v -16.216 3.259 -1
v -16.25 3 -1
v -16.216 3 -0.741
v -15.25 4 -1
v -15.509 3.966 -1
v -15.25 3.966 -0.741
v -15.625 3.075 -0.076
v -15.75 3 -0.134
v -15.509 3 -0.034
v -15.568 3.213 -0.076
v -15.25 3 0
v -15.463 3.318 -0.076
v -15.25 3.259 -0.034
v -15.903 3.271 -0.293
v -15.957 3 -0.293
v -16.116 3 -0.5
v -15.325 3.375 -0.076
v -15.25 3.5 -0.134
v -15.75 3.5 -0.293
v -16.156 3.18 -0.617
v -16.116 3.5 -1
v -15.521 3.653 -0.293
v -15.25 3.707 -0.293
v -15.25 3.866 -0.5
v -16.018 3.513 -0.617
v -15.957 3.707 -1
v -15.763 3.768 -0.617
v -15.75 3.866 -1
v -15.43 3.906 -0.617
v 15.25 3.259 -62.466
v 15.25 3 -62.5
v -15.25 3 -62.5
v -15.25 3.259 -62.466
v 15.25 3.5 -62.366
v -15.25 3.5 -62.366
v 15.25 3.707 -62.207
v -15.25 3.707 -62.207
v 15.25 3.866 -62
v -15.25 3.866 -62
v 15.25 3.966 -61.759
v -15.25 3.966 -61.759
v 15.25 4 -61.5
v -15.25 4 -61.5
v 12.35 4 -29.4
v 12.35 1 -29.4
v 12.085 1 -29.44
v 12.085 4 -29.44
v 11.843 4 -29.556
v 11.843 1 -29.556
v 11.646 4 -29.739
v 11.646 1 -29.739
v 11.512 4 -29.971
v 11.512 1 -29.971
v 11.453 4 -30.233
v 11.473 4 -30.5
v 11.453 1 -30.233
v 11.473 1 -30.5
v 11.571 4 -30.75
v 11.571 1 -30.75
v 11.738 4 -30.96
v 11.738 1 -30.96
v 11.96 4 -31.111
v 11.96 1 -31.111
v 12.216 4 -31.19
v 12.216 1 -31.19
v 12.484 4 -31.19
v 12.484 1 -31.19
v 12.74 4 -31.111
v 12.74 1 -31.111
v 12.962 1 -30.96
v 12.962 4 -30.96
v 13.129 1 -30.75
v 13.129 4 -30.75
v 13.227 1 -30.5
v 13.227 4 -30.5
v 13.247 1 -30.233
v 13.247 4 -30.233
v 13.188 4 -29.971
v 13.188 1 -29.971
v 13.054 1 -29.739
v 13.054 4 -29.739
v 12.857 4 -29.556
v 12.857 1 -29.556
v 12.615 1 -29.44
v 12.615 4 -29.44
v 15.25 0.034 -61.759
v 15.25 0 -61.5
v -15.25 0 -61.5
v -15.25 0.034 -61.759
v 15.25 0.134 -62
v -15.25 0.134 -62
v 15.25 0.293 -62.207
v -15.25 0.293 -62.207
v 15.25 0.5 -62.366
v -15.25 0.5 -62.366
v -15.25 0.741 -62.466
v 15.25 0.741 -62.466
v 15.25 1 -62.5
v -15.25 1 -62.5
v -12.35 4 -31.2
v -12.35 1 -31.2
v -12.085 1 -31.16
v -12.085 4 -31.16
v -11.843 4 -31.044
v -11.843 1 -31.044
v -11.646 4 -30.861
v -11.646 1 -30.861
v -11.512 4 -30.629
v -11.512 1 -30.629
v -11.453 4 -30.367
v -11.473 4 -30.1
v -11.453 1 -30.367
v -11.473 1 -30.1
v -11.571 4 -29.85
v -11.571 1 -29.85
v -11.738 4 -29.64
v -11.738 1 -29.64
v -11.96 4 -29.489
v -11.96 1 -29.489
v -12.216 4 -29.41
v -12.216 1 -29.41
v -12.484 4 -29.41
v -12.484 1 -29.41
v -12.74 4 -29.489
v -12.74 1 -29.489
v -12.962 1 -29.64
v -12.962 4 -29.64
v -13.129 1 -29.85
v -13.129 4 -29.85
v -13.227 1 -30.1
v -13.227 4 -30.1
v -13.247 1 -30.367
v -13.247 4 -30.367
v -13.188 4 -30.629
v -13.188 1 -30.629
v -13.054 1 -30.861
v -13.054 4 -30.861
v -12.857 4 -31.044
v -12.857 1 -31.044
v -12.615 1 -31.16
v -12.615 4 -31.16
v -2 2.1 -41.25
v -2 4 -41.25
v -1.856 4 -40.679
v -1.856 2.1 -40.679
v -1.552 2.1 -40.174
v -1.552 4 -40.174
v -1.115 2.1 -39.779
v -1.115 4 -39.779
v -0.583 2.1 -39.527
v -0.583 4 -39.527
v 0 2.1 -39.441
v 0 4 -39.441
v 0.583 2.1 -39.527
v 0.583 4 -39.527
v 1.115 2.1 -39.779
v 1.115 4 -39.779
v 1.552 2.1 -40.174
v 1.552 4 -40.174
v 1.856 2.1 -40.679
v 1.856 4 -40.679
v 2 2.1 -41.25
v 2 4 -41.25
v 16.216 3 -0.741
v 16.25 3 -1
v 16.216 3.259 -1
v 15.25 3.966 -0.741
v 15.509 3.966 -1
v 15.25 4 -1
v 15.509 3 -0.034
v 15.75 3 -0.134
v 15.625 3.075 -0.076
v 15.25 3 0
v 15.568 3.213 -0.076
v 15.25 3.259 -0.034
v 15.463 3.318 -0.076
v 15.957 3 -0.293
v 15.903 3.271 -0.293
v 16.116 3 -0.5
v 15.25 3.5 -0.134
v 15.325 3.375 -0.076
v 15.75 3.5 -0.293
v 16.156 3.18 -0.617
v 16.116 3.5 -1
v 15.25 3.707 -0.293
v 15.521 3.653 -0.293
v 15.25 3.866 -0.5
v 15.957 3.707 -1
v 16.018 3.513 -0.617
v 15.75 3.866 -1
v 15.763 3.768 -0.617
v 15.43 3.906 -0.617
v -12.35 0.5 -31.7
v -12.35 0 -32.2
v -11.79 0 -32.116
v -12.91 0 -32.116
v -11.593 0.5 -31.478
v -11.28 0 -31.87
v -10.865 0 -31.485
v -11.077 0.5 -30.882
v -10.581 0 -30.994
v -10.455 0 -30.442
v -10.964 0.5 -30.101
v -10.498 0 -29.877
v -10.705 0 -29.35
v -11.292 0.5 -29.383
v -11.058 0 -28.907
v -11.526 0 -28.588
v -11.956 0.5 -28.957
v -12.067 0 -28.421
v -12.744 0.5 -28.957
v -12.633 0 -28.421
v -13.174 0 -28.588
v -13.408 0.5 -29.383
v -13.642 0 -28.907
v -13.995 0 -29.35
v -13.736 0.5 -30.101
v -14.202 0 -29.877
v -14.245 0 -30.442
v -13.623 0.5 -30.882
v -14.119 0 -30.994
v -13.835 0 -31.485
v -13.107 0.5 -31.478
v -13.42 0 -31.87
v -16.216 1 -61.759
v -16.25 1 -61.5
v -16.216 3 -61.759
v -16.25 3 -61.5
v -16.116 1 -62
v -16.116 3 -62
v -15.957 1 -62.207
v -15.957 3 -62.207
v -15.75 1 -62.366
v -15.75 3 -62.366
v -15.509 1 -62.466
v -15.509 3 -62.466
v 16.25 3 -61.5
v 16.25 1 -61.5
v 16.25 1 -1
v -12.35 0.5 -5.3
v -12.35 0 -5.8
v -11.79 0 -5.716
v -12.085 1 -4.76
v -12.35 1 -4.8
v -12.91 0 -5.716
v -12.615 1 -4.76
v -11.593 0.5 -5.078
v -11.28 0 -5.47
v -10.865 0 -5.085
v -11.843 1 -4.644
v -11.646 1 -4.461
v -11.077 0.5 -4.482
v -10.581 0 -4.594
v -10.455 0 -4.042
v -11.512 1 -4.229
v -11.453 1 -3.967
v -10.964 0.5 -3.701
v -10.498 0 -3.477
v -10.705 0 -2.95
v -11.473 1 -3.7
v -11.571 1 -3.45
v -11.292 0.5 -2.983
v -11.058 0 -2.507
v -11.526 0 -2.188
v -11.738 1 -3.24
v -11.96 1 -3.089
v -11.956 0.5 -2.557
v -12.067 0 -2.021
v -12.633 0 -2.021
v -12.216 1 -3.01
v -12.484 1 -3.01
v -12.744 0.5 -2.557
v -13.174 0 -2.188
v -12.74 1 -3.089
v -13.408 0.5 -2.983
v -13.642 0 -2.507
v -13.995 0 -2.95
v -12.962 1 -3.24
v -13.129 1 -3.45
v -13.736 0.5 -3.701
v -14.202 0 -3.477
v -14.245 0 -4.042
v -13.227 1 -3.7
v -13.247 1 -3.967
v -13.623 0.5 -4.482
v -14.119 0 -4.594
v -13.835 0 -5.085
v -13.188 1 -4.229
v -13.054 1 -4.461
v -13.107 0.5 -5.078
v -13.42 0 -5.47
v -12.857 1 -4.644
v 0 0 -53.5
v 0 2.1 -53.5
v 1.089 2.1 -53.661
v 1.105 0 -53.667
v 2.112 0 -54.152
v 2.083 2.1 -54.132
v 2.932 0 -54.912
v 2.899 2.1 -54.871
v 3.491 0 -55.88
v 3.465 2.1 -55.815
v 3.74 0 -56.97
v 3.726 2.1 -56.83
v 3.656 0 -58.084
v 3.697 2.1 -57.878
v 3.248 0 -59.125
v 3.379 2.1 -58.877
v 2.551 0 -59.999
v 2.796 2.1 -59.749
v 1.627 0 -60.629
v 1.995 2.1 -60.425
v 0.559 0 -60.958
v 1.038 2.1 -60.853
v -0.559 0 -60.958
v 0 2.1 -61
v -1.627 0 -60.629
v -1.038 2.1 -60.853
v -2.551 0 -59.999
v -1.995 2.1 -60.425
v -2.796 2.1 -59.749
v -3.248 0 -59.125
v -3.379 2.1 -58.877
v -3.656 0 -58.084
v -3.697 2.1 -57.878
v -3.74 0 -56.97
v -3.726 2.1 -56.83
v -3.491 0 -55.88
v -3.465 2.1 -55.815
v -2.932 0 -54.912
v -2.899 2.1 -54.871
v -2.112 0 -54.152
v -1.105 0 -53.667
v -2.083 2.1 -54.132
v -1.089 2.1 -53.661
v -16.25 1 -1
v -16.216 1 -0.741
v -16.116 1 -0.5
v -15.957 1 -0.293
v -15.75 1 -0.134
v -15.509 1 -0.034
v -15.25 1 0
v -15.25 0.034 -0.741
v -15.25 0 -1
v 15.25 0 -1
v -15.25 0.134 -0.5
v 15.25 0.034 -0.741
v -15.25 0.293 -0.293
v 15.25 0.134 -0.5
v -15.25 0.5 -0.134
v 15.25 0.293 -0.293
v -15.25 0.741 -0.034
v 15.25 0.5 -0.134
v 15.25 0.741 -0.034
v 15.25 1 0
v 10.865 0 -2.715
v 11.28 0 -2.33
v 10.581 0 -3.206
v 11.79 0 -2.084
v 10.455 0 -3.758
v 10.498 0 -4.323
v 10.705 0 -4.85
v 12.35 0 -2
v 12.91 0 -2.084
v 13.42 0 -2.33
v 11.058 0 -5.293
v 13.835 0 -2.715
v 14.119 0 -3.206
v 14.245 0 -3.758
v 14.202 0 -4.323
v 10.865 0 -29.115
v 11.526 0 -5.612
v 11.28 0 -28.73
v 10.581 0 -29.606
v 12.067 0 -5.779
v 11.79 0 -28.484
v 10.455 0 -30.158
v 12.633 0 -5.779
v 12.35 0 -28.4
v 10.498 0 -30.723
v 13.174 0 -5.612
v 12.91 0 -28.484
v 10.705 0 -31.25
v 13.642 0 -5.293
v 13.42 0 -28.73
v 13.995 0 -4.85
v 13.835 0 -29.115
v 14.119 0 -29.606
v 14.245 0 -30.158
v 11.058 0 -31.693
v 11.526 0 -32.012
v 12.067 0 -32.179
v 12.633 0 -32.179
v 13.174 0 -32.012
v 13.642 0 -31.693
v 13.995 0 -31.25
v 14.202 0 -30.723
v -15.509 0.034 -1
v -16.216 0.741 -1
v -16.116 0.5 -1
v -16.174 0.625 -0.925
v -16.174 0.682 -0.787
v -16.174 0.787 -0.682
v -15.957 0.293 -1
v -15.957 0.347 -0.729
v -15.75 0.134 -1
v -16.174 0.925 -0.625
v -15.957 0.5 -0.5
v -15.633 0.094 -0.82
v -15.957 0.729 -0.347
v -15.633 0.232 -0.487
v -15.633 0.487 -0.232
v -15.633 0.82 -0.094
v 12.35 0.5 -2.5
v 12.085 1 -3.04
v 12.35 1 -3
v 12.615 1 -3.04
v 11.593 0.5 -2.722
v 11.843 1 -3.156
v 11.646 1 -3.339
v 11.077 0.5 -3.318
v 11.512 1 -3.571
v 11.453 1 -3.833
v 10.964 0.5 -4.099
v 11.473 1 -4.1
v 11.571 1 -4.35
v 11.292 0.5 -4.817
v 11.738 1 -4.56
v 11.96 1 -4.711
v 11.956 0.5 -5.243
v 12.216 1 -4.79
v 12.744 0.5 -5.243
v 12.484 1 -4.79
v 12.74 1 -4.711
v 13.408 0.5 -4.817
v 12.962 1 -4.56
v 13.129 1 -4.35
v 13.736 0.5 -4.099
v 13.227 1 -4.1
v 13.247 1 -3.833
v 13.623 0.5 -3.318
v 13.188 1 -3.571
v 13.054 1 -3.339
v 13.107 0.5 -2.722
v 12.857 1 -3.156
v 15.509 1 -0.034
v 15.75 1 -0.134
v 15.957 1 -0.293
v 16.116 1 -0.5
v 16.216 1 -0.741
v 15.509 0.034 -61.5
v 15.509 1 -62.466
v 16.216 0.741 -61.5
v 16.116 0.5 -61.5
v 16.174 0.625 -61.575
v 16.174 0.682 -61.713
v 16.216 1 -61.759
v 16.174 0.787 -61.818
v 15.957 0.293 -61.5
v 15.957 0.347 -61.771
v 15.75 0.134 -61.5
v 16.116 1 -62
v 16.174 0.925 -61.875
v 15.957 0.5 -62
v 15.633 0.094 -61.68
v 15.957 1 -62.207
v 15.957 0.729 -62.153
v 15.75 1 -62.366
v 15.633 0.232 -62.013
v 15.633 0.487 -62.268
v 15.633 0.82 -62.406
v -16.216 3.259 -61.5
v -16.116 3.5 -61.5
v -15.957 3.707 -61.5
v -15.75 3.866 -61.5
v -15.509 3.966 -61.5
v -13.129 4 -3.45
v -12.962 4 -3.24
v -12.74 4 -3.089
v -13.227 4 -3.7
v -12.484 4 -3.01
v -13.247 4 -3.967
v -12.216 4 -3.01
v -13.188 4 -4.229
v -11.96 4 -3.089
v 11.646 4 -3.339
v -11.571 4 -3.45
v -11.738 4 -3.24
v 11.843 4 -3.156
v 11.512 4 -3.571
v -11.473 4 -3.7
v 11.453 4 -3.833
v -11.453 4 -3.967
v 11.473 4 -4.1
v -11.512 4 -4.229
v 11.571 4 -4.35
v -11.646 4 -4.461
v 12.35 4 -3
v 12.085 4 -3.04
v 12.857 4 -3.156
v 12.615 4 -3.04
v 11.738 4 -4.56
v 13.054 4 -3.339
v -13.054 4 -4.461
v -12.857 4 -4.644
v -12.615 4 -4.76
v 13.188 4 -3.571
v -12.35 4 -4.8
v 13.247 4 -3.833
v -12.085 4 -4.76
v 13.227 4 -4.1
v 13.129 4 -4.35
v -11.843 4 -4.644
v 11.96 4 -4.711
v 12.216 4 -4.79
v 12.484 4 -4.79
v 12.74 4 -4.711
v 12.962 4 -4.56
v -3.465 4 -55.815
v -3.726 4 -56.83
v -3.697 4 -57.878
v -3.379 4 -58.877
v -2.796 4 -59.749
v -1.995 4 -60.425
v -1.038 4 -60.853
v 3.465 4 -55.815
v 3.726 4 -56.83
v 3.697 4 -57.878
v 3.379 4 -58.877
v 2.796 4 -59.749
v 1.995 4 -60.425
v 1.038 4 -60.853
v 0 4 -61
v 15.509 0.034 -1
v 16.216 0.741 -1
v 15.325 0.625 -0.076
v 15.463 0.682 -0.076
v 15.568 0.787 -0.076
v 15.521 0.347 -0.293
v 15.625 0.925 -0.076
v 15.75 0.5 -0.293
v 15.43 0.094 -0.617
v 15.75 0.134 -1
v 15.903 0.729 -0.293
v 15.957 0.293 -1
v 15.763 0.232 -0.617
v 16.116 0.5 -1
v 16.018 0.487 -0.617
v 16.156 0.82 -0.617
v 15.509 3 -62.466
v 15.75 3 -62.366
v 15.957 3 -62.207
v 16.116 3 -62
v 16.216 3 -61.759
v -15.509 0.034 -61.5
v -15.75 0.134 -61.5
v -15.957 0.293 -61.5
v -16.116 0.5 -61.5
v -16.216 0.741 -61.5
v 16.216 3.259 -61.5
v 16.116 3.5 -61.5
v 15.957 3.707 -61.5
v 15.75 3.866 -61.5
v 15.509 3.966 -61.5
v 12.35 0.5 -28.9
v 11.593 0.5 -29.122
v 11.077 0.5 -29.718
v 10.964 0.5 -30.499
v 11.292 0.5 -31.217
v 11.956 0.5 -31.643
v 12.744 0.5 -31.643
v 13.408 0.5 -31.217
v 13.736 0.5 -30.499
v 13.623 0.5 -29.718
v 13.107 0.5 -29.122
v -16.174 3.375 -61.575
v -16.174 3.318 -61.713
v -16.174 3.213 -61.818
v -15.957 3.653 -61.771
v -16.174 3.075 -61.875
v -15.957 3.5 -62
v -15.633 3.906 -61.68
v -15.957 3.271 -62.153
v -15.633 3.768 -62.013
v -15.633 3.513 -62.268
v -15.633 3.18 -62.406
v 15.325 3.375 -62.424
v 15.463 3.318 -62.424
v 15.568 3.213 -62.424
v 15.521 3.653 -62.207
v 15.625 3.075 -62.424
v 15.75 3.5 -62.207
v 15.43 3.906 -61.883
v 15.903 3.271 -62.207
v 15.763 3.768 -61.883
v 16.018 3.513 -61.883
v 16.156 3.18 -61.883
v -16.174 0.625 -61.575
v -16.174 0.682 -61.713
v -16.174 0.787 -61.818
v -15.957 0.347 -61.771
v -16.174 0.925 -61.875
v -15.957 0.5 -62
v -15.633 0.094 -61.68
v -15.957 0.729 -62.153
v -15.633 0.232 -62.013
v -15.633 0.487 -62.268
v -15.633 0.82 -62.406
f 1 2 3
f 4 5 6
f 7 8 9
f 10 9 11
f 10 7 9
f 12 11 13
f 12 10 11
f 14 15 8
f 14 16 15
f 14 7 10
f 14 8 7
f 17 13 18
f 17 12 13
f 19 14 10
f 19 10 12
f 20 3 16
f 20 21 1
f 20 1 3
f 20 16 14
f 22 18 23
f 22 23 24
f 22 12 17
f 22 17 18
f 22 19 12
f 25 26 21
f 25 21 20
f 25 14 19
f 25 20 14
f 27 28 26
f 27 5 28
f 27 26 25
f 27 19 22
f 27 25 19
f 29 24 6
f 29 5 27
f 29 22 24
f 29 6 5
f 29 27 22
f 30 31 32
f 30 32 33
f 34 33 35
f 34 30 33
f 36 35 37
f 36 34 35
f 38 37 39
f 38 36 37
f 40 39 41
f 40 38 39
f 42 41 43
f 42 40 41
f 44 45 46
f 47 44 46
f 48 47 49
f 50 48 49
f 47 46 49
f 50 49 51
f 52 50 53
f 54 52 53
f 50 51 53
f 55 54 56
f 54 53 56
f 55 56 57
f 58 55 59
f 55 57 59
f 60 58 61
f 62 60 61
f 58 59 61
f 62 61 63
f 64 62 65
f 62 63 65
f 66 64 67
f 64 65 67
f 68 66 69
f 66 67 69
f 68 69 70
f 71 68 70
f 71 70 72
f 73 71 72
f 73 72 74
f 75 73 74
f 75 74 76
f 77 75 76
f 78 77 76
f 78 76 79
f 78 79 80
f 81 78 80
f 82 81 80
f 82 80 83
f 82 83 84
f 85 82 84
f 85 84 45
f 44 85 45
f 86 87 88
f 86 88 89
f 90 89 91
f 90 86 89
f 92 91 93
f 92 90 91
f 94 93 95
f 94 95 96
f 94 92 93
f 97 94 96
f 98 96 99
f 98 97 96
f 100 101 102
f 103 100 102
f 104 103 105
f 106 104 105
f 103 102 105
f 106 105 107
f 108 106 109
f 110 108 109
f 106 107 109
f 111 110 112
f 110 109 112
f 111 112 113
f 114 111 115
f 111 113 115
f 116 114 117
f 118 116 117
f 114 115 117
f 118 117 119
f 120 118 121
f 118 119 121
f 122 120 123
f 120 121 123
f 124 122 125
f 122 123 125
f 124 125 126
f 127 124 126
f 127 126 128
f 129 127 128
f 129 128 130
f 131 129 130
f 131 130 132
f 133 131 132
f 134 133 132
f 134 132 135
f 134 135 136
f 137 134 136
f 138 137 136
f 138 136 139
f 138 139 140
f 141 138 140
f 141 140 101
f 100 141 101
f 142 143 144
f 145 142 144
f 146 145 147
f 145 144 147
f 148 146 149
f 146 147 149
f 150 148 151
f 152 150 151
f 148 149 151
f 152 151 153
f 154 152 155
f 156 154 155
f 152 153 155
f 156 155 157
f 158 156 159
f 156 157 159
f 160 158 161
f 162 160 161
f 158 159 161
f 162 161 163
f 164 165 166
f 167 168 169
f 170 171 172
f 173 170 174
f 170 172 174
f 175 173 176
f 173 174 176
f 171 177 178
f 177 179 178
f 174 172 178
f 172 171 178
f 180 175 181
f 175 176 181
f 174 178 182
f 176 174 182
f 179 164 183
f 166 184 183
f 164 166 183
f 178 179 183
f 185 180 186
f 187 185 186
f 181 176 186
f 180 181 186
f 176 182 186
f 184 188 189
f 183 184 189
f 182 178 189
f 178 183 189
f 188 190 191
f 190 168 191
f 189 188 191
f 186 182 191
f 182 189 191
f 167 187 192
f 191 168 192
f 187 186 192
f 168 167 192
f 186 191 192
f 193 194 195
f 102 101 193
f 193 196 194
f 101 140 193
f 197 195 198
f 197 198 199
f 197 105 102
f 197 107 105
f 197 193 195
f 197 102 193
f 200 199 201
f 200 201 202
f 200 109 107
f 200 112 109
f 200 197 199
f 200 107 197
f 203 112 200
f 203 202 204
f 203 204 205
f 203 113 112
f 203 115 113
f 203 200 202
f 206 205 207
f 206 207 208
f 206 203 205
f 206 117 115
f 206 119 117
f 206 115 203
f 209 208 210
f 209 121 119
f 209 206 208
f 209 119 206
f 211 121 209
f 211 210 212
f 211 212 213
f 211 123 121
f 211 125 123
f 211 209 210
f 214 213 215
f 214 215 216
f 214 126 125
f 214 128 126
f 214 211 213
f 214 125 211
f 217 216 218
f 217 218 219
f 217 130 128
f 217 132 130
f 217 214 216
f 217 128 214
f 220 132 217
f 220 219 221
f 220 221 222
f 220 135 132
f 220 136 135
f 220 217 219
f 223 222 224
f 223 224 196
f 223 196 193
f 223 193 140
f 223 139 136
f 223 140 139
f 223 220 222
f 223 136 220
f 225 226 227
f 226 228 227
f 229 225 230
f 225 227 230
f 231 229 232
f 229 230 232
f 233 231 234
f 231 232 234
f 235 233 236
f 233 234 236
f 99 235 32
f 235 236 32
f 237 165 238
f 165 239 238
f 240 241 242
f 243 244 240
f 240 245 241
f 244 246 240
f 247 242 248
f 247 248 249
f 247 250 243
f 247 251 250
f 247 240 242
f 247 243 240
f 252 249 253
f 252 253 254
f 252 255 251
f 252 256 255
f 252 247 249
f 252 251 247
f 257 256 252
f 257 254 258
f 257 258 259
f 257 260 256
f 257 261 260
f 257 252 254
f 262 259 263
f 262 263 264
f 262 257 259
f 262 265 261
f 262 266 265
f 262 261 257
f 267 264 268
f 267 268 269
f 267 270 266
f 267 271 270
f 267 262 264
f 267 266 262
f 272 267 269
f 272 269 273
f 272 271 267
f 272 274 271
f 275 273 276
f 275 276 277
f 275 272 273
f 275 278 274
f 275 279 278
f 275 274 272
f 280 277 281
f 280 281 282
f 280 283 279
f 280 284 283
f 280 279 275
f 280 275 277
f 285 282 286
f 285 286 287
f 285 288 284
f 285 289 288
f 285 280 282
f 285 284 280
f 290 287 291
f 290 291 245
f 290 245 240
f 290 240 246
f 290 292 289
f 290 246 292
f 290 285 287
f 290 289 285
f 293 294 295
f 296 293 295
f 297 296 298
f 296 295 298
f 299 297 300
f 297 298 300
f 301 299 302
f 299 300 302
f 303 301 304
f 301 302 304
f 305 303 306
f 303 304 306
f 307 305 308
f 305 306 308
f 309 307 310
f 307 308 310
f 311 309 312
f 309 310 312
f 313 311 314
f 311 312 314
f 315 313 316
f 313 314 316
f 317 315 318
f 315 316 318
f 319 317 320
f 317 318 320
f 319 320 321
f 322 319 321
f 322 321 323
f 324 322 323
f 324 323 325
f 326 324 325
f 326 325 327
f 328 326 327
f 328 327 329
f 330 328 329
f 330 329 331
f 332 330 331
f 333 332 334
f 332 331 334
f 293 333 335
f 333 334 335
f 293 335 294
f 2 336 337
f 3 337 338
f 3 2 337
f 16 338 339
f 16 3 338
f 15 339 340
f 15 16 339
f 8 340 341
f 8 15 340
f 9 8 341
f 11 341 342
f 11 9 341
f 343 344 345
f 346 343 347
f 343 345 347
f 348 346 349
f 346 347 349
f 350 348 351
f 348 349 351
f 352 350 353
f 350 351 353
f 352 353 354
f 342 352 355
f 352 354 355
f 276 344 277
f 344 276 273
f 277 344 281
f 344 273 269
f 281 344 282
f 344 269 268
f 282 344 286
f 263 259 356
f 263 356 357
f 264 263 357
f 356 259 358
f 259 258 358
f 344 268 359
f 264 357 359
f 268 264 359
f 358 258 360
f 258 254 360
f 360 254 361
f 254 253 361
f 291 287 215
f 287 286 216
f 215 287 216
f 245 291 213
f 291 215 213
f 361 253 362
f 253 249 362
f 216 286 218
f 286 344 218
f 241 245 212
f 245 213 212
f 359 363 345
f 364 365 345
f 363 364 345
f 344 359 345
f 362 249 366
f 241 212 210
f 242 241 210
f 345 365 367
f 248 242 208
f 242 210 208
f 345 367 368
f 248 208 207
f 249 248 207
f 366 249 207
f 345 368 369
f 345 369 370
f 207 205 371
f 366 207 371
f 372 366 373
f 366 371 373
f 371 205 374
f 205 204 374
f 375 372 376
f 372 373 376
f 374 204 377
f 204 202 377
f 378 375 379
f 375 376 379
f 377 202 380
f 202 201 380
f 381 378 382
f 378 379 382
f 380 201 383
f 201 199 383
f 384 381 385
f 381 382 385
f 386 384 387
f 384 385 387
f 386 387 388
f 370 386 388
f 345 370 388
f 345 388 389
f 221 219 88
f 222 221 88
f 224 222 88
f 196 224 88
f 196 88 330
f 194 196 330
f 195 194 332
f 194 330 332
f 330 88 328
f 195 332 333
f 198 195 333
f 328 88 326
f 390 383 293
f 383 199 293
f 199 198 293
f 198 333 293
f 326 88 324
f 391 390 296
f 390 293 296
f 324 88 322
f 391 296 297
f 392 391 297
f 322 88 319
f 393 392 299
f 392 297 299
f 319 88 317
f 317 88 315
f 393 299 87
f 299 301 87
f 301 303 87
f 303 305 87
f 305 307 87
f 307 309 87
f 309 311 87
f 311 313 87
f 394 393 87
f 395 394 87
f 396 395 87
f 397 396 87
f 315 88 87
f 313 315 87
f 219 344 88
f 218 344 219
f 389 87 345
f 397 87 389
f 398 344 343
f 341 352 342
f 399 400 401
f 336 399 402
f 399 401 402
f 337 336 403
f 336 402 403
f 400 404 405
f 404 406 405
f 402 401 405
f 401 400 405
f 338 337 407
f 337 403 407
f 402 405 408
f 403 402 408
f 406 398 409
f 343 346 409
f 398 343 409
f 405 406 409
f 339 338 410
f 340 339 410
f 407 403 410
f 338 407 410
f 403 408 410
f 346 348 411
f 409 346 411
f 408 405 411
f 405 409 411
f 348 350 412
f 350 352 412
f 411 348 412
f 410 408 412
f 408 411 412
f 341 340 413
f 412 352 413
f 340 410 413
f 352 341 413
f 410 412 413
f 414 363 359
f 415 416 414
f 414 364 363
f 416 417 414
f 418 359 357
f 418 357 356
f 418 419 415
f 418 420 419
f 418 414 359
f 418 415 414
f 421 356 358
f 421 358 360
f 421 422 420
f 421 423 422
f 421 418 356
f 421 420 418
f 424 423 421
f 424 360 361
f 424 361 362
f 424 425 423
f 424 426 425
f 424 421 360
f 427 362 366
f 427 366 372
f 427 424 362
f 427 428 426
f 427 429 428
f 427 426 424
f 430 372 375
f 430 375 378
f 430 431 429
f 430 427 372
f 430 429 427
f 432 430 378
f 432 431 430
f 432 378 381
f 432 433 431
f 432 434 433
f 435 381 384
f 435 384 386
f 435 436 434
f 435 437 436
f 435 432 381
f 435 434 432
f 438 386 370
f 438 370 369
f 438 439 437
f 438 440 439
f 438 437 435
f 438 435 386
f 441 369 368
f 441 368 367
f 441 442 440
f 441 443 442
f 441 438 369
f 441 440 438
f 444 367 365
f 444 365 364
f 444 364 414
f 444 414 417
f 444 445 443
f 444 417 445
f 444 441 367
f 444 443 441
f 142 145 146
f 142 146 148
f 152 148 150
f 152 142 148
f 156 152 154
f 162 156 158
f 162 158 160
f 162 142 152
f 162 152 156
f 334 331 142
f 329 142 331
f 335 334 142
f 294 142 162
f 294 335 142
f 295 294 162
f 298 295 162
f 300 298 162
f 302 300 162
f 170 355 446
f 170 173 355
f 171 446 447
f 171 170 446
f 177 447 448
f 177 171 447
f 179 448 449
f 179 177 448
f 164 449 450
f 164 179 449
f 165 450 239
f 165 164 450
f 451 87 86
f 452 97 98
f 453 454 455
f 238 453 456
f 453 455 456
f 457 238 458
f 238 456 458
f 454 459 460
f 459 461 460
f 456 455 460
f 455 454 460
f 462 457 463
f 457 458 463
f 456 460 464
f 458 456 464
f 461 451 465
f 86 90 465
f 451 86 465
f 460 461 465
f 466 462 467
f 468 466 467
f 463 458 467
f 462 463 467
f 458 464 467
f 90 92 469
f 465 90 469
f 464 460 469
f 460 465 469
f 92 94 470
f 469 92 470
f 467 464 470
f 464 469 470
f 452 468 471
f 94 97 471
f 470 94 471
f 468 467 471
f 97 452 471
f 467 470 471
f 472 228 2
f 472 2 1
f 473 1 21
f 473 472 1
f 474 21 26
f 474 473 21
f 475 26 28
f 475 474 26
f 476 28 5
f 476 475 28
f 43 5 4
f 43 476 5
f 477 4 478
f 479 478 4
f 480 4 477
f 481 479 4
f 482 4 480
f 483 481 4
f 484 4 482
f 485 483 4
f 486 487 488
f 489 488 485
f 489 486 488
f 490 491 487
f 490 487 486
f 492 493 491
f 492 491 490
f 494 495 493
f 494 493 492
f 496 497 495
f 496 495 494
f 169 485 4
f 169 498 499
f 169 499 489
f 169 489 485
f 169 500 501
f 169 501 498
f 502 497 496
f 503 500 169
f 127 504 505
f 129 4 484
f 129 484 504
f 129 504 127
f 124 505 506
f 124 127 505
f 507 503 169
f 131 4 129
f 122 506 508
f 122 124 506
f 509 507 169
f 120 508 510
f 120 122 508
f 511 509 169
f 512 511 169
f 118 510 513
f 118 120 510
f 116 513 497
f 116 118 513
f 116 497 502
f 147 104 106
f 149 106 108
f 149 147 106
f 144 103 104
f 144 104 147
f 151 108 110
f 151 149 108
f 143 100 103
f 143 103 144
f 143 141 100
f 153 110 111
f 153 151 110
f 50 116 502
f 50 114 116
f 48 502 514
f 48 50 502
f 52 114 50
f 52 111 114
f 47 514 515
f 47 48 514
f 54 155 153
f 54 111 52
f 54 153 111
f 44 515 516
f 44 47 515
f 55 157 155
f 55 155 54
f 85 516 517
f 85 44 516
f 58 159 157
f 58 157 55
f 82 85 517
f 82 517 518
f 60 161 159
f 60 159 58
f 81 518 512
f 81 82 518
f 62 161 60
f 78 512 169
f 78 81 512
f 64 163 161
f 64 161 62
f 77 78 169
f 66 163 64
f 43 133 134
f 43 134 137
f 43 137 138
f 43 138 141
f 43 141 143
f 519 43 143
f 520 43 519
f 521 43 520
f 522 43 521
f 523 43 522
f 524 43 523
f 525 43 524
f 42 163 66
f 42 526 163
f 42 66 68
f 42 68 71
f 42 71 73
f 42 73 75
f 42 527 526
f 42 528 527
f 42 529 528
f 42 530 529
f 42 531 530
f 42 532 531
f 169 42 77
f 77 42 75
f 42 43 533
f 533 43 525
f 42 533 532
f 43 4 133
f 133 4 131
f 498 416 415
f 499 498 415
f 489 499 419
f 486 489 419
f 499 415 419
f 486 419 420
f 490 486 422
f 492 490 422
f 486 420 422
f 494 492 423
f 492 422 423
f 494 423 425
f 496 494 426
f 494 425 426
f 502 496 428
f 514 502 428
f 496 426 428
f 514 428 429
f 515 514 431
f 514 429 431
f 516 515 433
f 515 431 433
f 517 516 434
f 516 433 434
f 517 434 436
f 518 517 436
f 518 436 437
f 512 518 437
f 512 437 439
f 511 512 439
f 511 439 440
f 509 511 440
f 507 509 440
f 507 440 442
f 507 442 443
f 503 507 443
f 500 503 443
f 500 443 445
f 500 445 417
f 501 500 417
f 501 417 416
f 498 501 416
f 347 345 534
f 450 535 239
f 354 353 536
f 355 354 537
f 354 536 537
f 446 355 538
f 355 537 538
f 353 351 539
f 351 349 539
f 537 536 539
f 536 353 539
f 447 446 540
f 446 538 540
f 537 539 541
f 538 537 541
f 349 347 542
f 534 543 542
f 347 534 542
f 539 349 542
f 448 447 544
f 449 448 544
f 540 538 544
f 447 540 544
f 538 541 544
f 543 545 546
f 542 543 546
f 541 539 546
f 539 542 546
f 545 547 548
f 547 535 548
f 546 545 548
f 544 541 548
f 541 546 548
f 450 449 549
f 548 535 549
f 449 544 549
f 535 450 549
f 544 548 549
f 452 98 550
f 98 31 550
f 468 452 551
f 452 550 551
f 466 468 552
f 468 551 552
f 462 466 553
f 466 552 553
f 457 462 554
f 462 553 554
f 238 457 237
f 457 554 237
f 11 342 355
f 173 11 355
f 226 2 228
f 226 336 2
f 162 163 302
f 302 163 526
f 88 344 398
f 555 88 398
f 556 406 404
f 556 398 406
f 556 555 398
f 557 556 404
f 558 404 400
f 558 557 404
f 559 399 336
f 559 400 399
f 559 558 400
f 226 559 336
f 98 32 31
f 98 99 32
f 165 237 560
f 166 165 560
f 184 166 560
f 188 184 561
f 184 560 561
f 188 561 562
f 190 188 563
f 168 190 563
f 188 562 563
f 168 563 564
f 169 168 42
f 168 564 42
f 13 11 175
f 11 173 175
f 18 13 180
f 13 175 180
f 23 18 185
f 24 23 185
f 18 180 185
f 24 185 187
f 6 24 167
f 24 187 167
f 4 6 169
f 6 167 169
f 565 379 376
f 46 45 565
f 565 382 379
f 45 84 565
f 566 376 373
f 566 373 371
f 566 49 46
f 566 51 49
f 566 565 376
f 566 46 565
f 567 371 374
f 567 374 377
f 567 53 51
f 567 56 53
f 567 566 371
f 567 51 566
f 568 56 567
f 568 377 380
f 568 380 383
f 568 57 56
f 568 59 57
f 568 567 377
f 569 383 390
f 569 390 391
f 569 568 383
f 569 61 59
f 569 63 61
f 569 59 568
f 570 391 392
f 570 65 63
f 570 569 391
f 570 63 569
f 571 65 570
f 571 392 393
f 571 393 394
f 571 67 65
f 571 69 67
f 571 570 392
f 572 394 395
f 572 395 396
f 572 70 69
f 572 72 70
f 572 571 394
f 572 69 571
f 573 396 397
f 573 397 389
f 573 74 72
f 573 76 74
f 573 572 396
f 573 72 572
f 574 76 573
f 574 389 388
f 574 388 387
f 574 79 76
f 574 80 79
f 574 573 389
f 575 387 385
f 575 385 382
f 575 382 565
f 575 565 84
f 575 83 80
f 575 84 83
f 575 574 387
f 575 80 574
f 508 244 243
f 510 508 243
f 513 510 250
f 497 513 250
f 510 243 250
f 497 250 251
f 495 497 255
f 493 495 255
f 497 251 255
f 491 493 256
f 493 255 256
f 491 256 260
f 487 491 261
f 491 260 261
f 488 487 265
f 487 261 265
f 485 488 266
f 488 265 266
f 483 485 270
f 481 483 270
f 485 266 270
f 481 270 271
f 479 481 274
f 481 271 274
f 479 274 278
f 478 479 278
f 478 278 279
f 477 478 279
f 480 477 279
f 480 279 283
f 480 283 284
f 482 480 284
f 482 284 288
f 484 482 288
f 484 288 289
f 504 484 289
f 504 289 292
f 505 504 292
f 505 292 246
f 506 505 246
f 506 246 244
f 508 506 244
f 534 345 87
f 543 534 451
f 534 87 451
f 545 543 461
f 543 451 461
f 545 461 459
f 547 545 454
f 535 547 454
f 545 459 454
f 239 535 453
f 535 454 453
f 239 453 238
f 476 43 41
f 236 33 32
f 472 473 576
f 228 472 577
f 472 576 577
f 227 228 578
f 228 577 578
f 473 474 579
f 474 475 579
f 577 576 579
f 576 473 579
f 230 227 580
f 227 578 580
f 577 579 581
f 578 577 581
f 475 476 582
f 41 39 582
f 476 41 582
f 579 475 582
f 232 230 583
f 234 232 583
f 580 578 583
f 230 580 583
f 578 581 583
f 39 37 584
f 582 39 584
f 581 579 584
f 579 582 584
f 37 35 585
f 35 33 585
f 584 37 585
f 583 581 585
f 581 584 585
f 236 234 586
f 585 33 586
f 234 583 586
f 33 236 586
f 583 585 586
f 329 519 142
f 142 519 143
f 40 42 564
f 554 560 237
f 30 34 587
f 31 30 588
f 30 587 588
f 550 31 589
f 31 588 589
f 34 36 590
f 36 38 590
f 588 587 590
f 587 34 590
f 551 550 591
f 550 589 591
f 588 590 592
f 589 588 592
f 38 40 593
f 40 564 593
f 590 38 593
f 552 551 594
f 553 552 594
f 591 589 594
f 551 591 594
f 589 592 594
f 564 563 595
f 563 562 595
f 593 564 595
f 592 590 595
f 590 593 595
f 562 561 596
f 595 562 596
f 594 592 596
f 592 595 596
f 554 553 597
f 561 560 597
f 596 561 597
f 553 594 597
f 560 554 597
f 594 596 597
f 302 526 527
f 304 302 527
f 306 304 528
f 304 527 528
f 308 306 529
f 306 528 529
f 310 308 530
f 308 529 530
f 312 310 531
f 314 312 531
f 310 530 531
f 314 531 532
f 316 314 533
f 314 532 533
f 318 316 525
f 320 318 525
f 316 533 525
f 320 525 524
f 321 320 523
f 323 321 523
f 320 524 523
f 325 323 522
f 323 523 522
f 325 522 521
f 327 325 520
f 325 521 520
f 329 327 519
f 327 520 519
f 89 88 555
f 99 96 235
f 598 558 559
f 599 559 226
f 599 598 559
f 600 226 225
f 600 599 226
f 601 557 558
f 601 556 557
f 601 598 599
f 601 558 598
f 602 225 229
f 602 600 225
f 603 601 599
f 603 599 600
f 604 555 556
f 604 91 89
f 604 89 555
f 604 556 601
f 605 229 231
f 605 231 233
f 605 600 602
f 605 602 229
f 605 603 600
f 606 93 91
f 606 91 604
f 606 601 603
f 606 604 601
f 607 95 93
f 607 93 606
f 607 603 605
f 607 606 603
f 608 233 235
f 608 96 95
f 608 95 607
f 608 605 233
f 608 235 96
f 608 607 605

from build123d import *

# Parameters (mm, degrees)
SKETCH1_W                     = 32.5
SKETCH1_H                     = 62.5
BASE_DEPTH                    = 4
SERVO_ARM_SLOT_DEPTH          = 1.9
SKETCH3_R                     = 3.75
SERVO_ARM_MOUNTING_HOLE_DEPTH = 65.612092521
SKETCH4_R                     = 0.9
SCANNER_MOUNTING_HOLES_DEPTH  = 65.701719452
MOUNTING_HOLE_CHAMFERS_SIZE   = 1
FILLET1_R                     = 1


with BuildPart() as part:
    # Sketch1 → Base (new body)
    with BuildSketch(Plane(origin=(0, 0, 0), x_dir=(1, 0, 0), z_dir=(0, 1, 0))):
        with Locations((0, 31.25)):
            Rectangle(SKETCH1_W, SKETCH1_H)
    extrude(amount=BASE_DEPTH)

    # Sketch2 → Servo Arm Slot (cut)
    with BuildSketch(Plane(origin=(0, 4, 0), x_dir=(1, 0, 0), z_dir=(0, 1, 0))):
        with BuildLine():
            Line((-3.46455, 55.814941361), (-2, 41.250001361))
            ThreePointArc((-2, 41.250001361), (0, 39.441022081), (2, 41.250001361))
            Line((2, 41.250001361), (3.46455, 55.814941361))
            ThreePointArc((3.46455, 55.814941361), (0, 61), (-3.46455, 55.814941361))
        make_face()
    extrude(amount=-SERVO_ARM_SLOT_DEPTH, mode=Mode.SUBTRACT)

    # Sketch3 → Servo Arm Mounting Hole (cut, through all)
    with BuildSketch(Plane(origin=(0, 2.1, 0), x_dir=(1, 0, 0), z_dir=(0, 1, 0))):
        with Locations(Location((0, 57.25, 0), (0, 0, 270))):
            Circle(SKETCH3_R)
    extrude(amount=-SERVO_ARM_MOUNTING_HOLE_DEPTH, mode=Mode.SUBTRACT)

    # Sketch4 → Scanner Mounting Holes (cut, through all)
    with BuildSketch(Plane.XZ):
        with Locations(Location((-12.35, -3.9, 0), (0, 0, 270))):
            Circle(SKETCH4_R)
        with Locations(Location((-12.35, -30.3, 0), (0, 0, 270))):
            Circle(SKETCH4_R)
        with Locations(Location((12.35, -30.3, 0), (0, 0, 90))):
            Circle(SKETCH4_R)
        with Locations(Location((12.35, -3.9, 0), (0, 0, 90))):
            Circle(SKETCH4_R)
    extrude(amount=-SCANNER_MOUNTING_HOLES_DEPTH, mode=Mode.SUBTRACT)

    # Mounting Hole Chamfers
    mounting_hole_chamfers_edges = [part.edges().sort_by_distance(p)[0] for p in [
        (12.35, 0, -4.8),
        (12.35, 0, -31.2),
        (-12.35, 0, -29.4),
        (-12.35, 0, -3),
    ]]
    chamfer(mounting_hole_chamfers_edges, length=MOUNTING_HOLE_CHAMFERS_SIZE)

    # Fillet1
    fillet1_edges = [part.edges().sort_by_distance(p)[0] for p in [
        (16.25, 4, -31.25),
        (0, 4, -62.5),
        (-16.25, 4, -31.25),
        (0, 0, -62.5),
        (16.25, 0, -31.25),
        (0, 0, 0),
        (-16.25, 0, -31.25),
        (-16.25, 2, -62.5),
        (16.25, 2, -62.5),
        (16.25, 2, 0),
        (-16.25, 2, 0),
        (0, 4, 0),
    ]]
    fillet(fillet1_edges, radius=FILLET1_R)


solid = part.part
